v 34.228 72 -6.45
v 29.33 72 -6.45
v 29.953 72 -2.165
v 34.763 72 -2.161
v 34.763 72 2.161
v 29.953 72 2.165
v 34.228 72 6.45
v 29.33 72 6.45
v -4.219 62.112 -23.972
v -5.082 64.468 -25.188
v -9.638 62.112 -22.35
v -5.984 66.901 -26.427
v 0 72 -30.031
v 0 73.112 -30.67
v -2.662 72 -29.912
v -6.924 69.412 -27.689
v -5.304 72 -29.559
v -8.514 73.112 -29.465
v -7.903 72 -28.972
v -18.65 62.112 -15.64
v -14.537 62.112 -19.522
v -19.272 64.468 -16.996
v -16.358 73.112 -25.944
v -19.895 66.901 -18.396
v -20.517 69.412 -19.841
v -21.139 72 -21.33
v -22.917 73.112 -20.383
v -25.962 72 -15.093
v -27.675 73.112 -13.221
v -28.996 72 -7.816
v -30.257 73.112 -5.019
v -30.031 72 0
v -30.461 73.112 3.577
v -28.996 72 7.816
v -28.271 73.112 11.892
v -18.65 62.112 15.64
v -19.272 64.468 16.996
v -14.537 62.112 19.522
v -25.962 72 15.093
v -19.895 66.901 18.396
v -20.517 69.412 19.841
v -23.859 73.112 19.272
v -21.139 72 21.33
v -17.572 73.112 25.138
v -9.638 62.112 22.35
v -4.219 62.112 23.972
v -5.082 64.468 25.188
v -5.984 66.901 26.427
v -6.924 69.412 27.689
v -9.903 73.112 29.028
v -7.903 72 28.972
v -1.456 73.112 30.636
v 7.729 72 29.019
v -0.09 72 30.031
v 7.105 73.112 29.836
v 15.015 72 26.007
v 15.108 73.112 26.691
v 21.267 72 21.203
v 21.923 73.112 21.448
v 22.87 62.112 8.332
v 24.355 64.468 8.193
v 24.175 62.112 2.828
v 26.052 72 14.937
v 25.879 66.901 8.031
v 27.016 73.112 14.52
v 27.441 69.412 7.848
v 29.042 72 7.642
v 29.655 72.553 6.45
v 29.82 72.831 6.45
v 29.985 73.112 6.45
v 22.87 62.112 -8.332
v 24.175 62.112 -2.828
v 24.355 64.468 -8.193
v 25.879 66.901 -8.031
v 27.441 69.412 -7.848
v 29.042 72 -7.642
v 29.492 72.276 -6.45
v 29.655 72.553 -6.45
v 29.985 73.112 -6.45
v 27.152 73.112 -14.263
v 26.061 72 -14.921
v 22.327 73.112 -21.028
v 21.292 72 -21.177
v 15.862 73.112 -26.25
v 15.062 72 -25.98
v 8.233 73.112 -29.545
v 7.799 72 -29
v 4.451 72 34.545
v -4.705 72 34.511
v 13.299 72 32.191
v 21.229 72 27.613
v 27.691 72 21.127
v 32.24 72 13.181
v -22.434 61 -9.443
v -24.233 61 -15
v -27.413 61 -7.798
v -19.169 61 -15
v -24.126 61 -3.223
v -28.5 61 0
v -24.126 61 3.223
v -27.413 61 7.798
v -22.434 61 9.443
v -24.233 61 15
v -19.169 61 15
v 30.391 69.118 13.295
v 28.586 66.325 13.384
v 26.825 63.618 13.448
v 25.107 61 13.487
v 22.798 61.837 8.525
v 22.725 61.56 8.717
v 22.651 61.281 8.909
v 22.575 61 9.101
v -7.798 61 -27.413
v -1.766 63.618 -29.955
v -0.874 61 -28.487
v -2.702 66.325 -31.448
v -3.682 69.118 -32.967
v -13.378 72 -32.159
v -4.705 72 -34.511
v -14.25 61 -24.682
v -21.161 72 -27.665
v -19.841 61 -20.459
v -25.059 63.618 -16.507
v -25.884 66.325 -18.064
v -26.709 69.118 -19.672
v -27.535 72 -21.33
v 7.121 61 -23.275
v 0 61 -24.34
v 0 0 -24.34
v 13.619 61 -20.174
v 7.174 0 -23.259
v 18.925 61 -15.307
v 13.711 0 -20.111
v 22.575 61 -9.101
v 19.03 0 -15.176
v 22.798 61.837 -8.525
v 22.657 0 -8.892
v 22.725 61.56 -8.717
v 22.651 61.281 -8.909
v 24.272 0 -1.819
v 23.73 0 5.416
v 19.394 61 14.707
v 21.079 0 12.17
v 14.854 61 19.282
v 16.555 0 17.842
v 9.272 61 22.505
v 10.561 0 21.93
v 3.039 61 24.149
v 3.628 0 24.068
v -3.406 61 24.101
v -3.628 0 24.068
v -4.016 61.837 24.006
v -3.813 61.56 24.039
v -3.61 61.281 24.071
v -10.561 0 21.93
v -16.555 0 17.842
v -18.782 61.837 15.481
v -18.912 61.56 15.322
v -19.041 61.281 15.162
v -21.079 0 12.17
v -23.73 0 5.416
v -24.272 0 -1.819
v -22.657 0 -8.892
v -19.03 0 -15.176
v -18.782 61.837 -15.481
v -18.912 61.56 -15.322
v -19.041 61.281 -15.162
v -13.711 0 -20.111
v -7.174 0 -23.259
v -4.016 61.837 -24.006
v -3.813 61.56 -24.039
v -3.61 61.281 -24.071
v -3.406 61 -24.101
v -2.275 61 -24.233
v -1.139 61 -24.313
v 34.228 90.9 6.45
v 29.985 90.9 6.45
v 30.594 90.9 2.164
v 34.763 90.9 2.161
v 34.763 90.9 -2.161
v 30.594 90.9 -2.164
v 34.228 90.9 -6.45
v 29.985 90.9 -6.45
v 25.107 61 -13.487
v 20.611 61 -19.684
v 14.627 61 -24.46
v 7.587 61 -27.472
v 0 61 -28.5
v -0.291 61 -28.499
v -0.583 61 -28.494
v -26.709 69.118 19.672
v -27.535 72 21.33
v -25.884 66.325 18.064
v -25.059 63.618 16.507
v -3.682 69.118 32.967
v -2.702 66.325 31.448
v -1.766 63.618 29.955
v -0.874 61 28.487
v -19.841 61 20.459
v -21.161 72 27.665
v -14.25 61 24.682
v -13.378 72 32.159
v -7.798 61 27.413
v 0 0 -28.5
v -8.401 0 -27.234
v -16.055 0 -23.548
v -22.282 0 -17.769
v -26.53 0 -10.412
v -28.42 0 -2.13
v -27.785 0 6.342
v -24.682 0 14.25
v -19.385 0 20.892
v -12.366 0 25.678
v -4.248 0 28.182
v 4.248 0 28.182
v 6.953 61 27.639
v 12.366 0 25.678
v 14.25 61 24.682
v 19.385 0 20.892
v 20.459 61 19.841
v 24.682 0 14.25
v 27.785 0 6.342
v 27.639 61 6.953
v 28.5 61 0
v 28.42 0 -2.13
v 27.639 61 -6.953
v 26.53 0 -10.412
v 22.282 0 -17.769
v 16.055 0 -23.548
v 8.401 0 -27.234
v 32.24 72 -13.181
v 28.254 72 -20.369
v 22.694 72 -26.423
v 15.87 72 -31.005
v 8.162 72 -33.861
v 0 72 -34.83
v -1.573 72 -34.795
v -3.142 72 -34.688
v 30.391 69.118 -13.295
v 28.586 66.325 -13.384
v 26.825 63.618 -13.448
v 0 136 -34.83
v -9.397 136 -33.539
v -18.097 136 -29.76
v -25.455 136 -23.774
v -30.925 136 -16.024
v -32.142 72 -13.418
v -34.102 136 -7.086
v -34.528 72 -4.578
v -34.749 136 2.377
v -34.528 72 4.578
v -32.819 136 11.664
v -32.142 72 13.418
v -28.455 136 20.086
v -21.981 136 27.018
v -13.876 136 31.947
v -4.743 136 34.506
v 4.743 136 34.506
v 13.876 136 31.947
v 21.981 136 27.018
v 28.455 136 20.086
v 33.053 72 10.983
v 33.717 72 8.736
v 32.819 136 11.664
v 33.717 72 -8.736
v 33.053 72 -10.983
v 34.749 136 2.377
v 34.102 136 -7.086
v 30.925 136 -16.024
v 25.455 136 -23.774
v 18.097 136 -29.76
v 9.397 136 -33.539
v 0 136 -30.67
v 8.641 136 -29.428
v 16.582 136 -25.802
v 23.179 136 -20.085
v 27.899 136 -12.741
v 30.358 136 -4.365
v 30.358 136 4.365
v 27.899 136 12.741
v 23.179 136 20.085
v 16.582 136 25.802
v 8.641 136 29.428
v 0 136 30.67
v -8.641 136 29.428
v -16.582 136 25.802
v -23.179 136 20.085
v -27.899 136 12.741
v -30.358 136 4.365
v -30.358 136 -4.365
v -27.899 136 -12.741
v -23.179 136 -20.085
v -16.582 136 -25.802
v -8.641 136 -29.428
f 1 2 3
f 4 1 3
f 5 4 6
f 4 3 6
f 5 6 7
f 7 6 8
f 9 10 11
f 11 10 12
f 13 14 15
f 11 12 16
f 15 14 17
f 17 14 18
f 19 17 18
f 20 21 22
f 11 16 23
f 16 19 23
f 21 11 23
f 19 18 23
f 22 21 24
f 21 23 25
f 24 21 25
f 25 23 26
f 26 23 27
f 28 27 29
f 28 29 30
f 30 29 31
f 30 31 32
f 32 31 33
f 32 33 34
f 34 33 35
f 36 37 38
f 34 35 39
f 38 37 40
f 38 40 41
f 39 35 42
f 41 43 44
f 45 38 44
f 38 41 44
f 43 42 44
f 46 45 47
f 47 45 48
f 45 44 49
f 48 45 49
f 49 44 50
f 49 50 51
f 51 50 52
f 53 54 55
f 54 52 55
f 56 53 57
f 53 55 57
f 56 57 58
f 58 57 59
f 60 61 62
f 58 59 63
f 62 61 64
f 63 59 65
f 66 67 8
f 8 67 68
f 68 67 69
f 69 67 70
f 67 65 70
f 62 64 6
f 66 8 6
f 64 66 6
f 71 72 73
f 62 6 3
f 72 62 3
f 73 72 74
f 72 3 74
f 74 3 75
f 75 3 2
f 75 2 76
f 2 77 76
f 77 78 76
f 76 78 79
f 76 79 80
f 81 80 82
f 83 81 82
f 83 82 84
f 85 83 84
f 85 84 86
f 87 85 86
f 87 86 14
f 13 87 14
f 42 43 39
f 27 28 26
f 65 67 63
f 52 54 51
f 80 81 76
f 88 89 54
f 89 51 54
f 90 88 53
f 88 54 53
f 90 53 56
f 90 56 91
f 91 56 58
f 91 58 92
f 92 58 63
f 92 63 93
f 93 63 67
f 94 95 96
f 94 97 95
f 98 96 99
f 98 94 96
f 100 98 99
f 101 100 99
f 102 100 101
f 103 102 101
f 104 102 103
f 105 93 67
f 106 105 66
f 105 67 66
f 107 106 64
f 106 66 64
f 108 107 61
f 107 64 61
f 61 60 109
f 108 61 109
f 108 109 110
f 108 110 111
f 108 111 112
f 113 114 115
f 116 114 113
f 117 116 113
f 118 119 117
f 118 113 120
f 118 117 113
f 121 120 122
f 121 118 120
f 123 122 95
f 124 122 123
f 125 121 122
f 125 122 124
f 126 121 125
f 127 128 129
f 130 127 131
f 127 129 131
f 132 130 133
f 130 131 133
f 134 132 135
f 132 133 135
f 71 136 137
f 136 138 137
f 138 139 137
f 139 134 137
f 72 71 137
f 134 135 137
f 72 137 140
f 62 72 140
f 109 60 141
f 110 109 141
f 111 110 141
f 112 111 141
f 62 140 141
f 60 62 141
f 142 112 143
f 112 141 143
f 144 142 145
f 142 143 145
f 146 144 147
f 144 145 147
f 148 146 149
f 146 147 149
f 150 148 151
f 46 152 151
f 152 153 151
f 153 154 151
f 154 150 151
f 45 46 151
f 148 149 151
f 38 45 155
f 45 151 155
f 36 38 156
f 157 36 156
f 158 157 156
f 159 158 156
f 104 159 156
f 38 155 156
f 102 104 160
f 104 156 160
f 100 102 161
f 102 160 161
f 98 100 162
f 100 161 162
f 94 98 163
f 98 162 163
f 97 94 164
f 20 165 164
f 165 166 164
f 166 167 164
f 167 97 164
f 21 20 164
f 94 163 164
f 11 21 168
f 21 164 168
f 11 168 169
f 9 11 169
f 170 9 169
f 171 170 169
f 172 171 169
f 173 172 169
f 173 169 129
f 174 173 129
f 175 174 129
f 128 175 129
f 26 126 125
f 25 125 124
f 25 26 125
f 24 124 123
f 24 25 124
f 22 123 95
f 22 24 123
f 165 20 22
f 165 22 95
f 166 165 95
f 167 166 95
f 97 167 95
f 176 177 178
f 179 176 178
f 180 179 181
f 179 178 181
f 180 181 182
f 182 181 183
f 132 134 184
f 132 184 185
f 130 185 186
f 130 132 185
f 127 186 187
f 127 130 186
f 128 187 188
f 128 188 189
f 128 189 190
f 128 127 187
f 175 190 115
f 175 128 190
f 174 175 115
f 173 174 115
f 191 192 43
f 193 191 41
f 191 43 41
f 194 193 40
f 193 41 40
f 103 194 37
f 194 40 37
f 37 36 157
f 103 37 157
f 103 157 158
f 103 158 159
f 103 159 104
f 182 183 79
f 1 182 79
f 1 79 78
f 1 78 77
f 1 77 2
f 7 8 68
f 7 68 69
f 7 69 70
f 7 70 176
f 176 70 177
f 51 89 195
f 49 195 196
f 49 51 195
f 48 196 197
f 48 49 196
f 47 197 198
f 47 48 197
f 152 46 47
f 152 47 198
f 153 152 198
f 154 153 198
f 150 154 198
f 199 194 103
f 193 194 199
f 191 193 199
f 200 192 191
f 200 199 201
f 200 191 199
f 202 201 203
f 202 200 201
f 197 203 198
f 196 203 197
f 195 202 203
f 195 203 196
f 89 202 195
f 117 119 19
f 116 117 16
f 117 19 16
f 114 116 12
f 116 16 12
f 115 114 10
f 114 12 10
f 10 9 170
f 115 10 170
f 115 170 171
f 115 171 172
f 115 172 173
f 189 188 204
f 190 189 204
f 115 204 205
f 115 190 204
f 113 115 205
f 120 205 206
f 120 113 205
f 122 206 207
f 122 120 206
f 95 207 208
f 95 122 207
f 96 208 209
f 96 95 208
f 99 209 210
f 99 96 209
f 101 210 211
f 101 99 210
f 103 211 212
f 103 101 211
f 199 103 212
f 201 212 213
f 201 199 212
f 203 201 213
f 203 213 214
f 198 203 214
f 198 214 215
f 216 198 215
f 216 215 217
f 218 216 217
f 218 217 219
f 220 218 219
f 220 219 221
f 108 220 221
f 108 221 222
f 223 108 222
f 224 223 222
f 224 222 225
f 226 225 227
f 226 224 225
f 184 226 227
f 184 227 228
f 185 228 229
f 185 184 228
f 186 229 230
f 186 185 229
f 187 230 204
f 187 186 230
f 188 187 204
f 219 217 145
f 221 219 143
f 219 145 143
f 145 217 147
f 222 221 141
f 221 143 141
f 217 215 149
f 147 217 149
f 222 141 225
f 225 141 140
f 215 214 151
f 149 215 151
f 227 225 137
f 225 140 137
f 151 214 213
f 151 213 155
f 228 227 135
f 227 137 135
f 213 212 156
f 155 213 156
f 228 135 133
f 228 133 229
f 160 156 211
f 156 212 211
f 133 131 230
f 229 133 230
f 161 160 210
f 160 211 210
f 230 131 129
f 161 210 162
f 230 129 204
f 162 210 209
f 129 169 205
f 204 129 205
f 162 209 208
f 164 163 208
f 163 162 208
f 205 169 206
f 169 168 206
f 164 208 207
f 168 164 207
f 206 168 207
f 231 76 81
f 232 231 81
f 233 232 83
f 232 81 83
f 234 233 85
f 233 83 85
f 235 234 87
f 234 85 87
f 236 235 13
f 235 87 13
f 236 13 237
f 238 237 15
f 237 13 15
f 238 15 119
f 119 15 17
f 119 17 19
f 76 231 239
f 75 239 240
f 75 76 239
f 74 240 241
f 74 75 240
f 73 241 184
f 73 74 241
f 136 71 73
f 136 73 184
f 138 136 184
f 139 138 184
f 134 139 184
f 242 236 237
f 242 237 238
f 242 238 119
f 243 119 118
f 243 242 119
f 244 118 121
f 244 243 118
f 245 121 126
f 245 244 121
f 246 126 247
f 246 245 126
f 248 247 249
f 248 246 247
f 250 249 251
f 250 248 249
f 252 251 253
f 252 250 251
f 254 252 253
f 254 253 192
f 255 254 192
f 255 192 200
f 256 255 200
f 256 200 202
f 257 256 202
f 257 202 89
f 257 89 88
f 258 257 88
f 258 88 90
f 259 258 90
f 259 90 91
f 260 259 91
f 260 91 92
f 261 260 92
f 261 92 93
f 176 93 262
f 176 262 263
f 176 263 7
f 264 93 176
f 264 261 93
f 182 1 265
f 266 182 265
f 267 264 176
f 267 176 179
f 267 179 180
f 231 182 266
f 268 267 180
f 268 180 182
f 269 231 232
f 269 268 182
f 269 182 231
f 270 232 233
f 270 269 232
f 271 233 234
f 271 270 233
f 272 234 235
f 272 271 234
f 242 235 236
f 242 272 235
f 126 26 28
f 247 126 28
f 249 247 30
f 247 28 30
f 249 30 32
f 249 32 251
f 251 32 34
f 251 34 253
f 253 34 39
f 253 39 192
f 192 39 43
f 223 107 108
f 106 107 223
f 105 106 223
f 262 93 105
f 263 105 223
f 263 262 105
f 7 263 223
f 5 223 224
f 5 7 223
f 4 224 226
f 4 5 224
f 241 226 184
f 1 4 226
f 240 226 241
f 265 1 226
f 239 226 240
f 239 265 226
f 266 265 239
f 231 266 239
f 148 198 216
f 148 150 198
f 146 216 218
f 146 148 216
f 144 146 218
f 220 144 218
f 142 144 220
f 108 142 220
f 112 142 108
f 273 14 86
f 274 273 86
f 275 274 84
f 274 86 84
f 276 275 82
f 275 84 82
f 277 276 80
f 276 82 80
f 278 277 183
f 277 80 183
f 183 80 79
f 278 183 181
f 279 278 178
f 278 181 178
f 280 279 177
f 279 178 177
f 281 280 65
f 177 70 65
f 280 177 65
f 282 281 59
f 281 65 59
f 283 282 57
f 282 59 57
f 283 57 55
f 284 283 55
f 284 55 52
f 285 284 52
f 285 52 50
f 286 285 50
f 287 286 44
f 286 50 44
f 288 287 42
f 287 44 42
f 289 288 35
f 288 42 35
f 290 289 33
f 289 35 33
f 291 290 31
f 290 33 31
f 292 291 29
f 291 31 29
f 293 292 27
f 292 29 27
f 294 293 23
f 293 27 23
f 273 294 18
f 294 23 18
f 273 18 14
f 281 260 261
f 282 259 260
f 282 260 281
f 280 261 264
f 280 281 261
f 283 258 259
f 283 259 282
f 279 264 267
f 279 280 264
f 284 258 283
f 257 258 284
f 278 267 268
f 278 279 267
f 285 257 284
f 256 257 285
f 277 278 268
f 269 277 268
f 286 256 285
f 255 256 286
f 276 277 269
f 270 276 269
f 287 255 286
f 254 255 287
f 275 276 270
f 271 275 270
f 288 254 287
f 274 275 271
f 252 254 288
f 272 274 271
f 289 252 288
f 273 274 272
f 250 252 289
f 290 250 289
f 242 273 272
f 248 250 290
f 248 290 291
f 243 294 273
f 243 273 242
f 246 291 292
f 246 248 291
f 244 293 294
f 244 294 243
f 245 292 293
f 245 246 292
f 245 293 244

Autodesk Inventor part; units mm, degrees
ref_plane "YZ Plane" through (0, 0, 0) normal (1, 0, 0) x (0, 1, 0)
ref_plane "XZ Plane" through (0, 0, 0) normal (0, 1, 0) x (-1, 0, 0)
ref_plane "XY Plane" through (0, 0, 0) normal (0, 0, 1) x (1, 0, 0)
sketch "草圖1" plane through (0, 0, 0) normal (1, 0, 0) x (0, 1, 0)
  line L0 (0, -28.5) -> (61, -28.5)
  line L1 (61, -28.5) -> (72, -34.8304)
  line L2 (72, -34.8304) -> (136, -34.8304)
  line L3 (136, -30.6704) -> (73.1116, -30.6704)
  line L4 (73.1116, -30.6704) -> (62.1116, -24.34)
  line L5 (62.1116, -24.34) -> (0, -24.34)
  line L6 (136, -34.8304) -> (136, -30.6704)
  line L7 (0, -28.5) -> (0, -24.34)
  line L8 (-27.2, 0) -> (163.2, 0) projected
  point P0 (0, 0)
  dimension "d1" = 61
  dimension "d4" = 64
  dimension "d5" = 28.5
  dimension "d6" = 11
  dimension "d7" = 4.16
revolve "迴轉1" add sketch "草圖1" angle 360 about axis through (0, -10, 0) along (0, 1, 0)
sketch "草圖2" plane through (0, 0, 0) normal (1, 0, 0) x (0, 1, 0)
  line L0 (72, -34.8304) -> (72, 34.8304) projected
  line L1 (72, 6.45) -> (90.9, 6.45)
  line L2 (90.9, 6.45) -> (90.9, -6.45)
  line L3 (90.9, -6.45) -> (72, -6.45)
  line L4 (72, -6.45) -> (72, 6.45)
  point P0 (0, 0)
  point P1 (72, 0)
  dimension "d9" = 18.9
  dimension "d10" = 12.9
extrude "擠出1" cut sketch "草圖2" along normal through all
sketch "草圖3" plane through (0, 0, 0) normal (1, 0, 0) x (0, 1, 0)
  line L0 (72, -6.45) -> (72, 6.45) projected
  line L1 (72, 6.45) -> (72, -6.45) projected
  line L2 (61, -28.5) -> (61, 28.5) projected
  line L3 (61, -28.5) -> (72, -34.8304) projected
  line L4 (72, -34.8304) -> (72, 34.8304) projected
  line L5 (61, 28.5) -> (72, 34.8304) projected
  line L6 (61, -28.5) -> (61, 28.5) projected
  line L7 (72, -21.3304) -> (61, -15)
  line L8 (72, 21.3304) -> (61, 15)
  point P0 (0, 0)
  point P1 (61, 0)
  point P2 (61, 0)
  dimension "d17" = 15
  dimension "d18" = 15
extrude "擠出2" cut sketch "草圖3" against normal through all contours L4 L7 L2 L8 L0
pattern_circular "環形陣列1" count 3 over 360 about axis through (0, -10, 0) along (0, 1, 0) of "擠出2"
equation "\"d18\" = d17"
properties part number "outercase"
